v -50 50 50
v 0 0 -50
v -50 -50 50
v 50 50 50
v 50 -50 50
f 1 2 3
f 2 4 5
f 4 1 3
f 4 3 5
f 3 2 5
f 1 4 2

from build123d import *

# Parameters (mm, degrees)
F0_W          = 100
F0_H          = 100
F1_DEPTH      = 50
F3_DEPTH      = 100
F5_DEPTH      = 100
F5_DEPTH_BACK = 100


with BuildPart() as f1:
    # F0 (on Top) → F1 (new body, symmetric)
    with BuildSketch(Plane.XY):
        Rectangle(F0_W, F0_H)
    extrude(amount=F1_DEPTH, both=True)

    # F2 (on face) → F3 (cut, through all)
    with BuildSketch(Plane.YZ.offset(50)):
        Polygon((-50, -50), (0, -50), (-50, 50), align=None)
        Polygon((50, -50), (50, 50), (0, -50), align=None)
    extrude(amount=-F3_DEPTH, mode=Mode.SUBTRACT)

    # F4 (on Front) → F5 (cut, two sides)
    with BuildSketch(Plane.XZ) as f5_sk:
        Polygon((50, 50), (0, -50), (50, -50), align=None)
        Polygon((0, -50), (-50, 50), (-50, -50), align=None)
    extrude(amount=-F5_DEPTH, mode=Mode.SUBTRACT)
    extrude(f5_sk.sketch, amount=F5_DEPTH_BACK, mode=Mode.SUBTRACT)


solid = f1.part
